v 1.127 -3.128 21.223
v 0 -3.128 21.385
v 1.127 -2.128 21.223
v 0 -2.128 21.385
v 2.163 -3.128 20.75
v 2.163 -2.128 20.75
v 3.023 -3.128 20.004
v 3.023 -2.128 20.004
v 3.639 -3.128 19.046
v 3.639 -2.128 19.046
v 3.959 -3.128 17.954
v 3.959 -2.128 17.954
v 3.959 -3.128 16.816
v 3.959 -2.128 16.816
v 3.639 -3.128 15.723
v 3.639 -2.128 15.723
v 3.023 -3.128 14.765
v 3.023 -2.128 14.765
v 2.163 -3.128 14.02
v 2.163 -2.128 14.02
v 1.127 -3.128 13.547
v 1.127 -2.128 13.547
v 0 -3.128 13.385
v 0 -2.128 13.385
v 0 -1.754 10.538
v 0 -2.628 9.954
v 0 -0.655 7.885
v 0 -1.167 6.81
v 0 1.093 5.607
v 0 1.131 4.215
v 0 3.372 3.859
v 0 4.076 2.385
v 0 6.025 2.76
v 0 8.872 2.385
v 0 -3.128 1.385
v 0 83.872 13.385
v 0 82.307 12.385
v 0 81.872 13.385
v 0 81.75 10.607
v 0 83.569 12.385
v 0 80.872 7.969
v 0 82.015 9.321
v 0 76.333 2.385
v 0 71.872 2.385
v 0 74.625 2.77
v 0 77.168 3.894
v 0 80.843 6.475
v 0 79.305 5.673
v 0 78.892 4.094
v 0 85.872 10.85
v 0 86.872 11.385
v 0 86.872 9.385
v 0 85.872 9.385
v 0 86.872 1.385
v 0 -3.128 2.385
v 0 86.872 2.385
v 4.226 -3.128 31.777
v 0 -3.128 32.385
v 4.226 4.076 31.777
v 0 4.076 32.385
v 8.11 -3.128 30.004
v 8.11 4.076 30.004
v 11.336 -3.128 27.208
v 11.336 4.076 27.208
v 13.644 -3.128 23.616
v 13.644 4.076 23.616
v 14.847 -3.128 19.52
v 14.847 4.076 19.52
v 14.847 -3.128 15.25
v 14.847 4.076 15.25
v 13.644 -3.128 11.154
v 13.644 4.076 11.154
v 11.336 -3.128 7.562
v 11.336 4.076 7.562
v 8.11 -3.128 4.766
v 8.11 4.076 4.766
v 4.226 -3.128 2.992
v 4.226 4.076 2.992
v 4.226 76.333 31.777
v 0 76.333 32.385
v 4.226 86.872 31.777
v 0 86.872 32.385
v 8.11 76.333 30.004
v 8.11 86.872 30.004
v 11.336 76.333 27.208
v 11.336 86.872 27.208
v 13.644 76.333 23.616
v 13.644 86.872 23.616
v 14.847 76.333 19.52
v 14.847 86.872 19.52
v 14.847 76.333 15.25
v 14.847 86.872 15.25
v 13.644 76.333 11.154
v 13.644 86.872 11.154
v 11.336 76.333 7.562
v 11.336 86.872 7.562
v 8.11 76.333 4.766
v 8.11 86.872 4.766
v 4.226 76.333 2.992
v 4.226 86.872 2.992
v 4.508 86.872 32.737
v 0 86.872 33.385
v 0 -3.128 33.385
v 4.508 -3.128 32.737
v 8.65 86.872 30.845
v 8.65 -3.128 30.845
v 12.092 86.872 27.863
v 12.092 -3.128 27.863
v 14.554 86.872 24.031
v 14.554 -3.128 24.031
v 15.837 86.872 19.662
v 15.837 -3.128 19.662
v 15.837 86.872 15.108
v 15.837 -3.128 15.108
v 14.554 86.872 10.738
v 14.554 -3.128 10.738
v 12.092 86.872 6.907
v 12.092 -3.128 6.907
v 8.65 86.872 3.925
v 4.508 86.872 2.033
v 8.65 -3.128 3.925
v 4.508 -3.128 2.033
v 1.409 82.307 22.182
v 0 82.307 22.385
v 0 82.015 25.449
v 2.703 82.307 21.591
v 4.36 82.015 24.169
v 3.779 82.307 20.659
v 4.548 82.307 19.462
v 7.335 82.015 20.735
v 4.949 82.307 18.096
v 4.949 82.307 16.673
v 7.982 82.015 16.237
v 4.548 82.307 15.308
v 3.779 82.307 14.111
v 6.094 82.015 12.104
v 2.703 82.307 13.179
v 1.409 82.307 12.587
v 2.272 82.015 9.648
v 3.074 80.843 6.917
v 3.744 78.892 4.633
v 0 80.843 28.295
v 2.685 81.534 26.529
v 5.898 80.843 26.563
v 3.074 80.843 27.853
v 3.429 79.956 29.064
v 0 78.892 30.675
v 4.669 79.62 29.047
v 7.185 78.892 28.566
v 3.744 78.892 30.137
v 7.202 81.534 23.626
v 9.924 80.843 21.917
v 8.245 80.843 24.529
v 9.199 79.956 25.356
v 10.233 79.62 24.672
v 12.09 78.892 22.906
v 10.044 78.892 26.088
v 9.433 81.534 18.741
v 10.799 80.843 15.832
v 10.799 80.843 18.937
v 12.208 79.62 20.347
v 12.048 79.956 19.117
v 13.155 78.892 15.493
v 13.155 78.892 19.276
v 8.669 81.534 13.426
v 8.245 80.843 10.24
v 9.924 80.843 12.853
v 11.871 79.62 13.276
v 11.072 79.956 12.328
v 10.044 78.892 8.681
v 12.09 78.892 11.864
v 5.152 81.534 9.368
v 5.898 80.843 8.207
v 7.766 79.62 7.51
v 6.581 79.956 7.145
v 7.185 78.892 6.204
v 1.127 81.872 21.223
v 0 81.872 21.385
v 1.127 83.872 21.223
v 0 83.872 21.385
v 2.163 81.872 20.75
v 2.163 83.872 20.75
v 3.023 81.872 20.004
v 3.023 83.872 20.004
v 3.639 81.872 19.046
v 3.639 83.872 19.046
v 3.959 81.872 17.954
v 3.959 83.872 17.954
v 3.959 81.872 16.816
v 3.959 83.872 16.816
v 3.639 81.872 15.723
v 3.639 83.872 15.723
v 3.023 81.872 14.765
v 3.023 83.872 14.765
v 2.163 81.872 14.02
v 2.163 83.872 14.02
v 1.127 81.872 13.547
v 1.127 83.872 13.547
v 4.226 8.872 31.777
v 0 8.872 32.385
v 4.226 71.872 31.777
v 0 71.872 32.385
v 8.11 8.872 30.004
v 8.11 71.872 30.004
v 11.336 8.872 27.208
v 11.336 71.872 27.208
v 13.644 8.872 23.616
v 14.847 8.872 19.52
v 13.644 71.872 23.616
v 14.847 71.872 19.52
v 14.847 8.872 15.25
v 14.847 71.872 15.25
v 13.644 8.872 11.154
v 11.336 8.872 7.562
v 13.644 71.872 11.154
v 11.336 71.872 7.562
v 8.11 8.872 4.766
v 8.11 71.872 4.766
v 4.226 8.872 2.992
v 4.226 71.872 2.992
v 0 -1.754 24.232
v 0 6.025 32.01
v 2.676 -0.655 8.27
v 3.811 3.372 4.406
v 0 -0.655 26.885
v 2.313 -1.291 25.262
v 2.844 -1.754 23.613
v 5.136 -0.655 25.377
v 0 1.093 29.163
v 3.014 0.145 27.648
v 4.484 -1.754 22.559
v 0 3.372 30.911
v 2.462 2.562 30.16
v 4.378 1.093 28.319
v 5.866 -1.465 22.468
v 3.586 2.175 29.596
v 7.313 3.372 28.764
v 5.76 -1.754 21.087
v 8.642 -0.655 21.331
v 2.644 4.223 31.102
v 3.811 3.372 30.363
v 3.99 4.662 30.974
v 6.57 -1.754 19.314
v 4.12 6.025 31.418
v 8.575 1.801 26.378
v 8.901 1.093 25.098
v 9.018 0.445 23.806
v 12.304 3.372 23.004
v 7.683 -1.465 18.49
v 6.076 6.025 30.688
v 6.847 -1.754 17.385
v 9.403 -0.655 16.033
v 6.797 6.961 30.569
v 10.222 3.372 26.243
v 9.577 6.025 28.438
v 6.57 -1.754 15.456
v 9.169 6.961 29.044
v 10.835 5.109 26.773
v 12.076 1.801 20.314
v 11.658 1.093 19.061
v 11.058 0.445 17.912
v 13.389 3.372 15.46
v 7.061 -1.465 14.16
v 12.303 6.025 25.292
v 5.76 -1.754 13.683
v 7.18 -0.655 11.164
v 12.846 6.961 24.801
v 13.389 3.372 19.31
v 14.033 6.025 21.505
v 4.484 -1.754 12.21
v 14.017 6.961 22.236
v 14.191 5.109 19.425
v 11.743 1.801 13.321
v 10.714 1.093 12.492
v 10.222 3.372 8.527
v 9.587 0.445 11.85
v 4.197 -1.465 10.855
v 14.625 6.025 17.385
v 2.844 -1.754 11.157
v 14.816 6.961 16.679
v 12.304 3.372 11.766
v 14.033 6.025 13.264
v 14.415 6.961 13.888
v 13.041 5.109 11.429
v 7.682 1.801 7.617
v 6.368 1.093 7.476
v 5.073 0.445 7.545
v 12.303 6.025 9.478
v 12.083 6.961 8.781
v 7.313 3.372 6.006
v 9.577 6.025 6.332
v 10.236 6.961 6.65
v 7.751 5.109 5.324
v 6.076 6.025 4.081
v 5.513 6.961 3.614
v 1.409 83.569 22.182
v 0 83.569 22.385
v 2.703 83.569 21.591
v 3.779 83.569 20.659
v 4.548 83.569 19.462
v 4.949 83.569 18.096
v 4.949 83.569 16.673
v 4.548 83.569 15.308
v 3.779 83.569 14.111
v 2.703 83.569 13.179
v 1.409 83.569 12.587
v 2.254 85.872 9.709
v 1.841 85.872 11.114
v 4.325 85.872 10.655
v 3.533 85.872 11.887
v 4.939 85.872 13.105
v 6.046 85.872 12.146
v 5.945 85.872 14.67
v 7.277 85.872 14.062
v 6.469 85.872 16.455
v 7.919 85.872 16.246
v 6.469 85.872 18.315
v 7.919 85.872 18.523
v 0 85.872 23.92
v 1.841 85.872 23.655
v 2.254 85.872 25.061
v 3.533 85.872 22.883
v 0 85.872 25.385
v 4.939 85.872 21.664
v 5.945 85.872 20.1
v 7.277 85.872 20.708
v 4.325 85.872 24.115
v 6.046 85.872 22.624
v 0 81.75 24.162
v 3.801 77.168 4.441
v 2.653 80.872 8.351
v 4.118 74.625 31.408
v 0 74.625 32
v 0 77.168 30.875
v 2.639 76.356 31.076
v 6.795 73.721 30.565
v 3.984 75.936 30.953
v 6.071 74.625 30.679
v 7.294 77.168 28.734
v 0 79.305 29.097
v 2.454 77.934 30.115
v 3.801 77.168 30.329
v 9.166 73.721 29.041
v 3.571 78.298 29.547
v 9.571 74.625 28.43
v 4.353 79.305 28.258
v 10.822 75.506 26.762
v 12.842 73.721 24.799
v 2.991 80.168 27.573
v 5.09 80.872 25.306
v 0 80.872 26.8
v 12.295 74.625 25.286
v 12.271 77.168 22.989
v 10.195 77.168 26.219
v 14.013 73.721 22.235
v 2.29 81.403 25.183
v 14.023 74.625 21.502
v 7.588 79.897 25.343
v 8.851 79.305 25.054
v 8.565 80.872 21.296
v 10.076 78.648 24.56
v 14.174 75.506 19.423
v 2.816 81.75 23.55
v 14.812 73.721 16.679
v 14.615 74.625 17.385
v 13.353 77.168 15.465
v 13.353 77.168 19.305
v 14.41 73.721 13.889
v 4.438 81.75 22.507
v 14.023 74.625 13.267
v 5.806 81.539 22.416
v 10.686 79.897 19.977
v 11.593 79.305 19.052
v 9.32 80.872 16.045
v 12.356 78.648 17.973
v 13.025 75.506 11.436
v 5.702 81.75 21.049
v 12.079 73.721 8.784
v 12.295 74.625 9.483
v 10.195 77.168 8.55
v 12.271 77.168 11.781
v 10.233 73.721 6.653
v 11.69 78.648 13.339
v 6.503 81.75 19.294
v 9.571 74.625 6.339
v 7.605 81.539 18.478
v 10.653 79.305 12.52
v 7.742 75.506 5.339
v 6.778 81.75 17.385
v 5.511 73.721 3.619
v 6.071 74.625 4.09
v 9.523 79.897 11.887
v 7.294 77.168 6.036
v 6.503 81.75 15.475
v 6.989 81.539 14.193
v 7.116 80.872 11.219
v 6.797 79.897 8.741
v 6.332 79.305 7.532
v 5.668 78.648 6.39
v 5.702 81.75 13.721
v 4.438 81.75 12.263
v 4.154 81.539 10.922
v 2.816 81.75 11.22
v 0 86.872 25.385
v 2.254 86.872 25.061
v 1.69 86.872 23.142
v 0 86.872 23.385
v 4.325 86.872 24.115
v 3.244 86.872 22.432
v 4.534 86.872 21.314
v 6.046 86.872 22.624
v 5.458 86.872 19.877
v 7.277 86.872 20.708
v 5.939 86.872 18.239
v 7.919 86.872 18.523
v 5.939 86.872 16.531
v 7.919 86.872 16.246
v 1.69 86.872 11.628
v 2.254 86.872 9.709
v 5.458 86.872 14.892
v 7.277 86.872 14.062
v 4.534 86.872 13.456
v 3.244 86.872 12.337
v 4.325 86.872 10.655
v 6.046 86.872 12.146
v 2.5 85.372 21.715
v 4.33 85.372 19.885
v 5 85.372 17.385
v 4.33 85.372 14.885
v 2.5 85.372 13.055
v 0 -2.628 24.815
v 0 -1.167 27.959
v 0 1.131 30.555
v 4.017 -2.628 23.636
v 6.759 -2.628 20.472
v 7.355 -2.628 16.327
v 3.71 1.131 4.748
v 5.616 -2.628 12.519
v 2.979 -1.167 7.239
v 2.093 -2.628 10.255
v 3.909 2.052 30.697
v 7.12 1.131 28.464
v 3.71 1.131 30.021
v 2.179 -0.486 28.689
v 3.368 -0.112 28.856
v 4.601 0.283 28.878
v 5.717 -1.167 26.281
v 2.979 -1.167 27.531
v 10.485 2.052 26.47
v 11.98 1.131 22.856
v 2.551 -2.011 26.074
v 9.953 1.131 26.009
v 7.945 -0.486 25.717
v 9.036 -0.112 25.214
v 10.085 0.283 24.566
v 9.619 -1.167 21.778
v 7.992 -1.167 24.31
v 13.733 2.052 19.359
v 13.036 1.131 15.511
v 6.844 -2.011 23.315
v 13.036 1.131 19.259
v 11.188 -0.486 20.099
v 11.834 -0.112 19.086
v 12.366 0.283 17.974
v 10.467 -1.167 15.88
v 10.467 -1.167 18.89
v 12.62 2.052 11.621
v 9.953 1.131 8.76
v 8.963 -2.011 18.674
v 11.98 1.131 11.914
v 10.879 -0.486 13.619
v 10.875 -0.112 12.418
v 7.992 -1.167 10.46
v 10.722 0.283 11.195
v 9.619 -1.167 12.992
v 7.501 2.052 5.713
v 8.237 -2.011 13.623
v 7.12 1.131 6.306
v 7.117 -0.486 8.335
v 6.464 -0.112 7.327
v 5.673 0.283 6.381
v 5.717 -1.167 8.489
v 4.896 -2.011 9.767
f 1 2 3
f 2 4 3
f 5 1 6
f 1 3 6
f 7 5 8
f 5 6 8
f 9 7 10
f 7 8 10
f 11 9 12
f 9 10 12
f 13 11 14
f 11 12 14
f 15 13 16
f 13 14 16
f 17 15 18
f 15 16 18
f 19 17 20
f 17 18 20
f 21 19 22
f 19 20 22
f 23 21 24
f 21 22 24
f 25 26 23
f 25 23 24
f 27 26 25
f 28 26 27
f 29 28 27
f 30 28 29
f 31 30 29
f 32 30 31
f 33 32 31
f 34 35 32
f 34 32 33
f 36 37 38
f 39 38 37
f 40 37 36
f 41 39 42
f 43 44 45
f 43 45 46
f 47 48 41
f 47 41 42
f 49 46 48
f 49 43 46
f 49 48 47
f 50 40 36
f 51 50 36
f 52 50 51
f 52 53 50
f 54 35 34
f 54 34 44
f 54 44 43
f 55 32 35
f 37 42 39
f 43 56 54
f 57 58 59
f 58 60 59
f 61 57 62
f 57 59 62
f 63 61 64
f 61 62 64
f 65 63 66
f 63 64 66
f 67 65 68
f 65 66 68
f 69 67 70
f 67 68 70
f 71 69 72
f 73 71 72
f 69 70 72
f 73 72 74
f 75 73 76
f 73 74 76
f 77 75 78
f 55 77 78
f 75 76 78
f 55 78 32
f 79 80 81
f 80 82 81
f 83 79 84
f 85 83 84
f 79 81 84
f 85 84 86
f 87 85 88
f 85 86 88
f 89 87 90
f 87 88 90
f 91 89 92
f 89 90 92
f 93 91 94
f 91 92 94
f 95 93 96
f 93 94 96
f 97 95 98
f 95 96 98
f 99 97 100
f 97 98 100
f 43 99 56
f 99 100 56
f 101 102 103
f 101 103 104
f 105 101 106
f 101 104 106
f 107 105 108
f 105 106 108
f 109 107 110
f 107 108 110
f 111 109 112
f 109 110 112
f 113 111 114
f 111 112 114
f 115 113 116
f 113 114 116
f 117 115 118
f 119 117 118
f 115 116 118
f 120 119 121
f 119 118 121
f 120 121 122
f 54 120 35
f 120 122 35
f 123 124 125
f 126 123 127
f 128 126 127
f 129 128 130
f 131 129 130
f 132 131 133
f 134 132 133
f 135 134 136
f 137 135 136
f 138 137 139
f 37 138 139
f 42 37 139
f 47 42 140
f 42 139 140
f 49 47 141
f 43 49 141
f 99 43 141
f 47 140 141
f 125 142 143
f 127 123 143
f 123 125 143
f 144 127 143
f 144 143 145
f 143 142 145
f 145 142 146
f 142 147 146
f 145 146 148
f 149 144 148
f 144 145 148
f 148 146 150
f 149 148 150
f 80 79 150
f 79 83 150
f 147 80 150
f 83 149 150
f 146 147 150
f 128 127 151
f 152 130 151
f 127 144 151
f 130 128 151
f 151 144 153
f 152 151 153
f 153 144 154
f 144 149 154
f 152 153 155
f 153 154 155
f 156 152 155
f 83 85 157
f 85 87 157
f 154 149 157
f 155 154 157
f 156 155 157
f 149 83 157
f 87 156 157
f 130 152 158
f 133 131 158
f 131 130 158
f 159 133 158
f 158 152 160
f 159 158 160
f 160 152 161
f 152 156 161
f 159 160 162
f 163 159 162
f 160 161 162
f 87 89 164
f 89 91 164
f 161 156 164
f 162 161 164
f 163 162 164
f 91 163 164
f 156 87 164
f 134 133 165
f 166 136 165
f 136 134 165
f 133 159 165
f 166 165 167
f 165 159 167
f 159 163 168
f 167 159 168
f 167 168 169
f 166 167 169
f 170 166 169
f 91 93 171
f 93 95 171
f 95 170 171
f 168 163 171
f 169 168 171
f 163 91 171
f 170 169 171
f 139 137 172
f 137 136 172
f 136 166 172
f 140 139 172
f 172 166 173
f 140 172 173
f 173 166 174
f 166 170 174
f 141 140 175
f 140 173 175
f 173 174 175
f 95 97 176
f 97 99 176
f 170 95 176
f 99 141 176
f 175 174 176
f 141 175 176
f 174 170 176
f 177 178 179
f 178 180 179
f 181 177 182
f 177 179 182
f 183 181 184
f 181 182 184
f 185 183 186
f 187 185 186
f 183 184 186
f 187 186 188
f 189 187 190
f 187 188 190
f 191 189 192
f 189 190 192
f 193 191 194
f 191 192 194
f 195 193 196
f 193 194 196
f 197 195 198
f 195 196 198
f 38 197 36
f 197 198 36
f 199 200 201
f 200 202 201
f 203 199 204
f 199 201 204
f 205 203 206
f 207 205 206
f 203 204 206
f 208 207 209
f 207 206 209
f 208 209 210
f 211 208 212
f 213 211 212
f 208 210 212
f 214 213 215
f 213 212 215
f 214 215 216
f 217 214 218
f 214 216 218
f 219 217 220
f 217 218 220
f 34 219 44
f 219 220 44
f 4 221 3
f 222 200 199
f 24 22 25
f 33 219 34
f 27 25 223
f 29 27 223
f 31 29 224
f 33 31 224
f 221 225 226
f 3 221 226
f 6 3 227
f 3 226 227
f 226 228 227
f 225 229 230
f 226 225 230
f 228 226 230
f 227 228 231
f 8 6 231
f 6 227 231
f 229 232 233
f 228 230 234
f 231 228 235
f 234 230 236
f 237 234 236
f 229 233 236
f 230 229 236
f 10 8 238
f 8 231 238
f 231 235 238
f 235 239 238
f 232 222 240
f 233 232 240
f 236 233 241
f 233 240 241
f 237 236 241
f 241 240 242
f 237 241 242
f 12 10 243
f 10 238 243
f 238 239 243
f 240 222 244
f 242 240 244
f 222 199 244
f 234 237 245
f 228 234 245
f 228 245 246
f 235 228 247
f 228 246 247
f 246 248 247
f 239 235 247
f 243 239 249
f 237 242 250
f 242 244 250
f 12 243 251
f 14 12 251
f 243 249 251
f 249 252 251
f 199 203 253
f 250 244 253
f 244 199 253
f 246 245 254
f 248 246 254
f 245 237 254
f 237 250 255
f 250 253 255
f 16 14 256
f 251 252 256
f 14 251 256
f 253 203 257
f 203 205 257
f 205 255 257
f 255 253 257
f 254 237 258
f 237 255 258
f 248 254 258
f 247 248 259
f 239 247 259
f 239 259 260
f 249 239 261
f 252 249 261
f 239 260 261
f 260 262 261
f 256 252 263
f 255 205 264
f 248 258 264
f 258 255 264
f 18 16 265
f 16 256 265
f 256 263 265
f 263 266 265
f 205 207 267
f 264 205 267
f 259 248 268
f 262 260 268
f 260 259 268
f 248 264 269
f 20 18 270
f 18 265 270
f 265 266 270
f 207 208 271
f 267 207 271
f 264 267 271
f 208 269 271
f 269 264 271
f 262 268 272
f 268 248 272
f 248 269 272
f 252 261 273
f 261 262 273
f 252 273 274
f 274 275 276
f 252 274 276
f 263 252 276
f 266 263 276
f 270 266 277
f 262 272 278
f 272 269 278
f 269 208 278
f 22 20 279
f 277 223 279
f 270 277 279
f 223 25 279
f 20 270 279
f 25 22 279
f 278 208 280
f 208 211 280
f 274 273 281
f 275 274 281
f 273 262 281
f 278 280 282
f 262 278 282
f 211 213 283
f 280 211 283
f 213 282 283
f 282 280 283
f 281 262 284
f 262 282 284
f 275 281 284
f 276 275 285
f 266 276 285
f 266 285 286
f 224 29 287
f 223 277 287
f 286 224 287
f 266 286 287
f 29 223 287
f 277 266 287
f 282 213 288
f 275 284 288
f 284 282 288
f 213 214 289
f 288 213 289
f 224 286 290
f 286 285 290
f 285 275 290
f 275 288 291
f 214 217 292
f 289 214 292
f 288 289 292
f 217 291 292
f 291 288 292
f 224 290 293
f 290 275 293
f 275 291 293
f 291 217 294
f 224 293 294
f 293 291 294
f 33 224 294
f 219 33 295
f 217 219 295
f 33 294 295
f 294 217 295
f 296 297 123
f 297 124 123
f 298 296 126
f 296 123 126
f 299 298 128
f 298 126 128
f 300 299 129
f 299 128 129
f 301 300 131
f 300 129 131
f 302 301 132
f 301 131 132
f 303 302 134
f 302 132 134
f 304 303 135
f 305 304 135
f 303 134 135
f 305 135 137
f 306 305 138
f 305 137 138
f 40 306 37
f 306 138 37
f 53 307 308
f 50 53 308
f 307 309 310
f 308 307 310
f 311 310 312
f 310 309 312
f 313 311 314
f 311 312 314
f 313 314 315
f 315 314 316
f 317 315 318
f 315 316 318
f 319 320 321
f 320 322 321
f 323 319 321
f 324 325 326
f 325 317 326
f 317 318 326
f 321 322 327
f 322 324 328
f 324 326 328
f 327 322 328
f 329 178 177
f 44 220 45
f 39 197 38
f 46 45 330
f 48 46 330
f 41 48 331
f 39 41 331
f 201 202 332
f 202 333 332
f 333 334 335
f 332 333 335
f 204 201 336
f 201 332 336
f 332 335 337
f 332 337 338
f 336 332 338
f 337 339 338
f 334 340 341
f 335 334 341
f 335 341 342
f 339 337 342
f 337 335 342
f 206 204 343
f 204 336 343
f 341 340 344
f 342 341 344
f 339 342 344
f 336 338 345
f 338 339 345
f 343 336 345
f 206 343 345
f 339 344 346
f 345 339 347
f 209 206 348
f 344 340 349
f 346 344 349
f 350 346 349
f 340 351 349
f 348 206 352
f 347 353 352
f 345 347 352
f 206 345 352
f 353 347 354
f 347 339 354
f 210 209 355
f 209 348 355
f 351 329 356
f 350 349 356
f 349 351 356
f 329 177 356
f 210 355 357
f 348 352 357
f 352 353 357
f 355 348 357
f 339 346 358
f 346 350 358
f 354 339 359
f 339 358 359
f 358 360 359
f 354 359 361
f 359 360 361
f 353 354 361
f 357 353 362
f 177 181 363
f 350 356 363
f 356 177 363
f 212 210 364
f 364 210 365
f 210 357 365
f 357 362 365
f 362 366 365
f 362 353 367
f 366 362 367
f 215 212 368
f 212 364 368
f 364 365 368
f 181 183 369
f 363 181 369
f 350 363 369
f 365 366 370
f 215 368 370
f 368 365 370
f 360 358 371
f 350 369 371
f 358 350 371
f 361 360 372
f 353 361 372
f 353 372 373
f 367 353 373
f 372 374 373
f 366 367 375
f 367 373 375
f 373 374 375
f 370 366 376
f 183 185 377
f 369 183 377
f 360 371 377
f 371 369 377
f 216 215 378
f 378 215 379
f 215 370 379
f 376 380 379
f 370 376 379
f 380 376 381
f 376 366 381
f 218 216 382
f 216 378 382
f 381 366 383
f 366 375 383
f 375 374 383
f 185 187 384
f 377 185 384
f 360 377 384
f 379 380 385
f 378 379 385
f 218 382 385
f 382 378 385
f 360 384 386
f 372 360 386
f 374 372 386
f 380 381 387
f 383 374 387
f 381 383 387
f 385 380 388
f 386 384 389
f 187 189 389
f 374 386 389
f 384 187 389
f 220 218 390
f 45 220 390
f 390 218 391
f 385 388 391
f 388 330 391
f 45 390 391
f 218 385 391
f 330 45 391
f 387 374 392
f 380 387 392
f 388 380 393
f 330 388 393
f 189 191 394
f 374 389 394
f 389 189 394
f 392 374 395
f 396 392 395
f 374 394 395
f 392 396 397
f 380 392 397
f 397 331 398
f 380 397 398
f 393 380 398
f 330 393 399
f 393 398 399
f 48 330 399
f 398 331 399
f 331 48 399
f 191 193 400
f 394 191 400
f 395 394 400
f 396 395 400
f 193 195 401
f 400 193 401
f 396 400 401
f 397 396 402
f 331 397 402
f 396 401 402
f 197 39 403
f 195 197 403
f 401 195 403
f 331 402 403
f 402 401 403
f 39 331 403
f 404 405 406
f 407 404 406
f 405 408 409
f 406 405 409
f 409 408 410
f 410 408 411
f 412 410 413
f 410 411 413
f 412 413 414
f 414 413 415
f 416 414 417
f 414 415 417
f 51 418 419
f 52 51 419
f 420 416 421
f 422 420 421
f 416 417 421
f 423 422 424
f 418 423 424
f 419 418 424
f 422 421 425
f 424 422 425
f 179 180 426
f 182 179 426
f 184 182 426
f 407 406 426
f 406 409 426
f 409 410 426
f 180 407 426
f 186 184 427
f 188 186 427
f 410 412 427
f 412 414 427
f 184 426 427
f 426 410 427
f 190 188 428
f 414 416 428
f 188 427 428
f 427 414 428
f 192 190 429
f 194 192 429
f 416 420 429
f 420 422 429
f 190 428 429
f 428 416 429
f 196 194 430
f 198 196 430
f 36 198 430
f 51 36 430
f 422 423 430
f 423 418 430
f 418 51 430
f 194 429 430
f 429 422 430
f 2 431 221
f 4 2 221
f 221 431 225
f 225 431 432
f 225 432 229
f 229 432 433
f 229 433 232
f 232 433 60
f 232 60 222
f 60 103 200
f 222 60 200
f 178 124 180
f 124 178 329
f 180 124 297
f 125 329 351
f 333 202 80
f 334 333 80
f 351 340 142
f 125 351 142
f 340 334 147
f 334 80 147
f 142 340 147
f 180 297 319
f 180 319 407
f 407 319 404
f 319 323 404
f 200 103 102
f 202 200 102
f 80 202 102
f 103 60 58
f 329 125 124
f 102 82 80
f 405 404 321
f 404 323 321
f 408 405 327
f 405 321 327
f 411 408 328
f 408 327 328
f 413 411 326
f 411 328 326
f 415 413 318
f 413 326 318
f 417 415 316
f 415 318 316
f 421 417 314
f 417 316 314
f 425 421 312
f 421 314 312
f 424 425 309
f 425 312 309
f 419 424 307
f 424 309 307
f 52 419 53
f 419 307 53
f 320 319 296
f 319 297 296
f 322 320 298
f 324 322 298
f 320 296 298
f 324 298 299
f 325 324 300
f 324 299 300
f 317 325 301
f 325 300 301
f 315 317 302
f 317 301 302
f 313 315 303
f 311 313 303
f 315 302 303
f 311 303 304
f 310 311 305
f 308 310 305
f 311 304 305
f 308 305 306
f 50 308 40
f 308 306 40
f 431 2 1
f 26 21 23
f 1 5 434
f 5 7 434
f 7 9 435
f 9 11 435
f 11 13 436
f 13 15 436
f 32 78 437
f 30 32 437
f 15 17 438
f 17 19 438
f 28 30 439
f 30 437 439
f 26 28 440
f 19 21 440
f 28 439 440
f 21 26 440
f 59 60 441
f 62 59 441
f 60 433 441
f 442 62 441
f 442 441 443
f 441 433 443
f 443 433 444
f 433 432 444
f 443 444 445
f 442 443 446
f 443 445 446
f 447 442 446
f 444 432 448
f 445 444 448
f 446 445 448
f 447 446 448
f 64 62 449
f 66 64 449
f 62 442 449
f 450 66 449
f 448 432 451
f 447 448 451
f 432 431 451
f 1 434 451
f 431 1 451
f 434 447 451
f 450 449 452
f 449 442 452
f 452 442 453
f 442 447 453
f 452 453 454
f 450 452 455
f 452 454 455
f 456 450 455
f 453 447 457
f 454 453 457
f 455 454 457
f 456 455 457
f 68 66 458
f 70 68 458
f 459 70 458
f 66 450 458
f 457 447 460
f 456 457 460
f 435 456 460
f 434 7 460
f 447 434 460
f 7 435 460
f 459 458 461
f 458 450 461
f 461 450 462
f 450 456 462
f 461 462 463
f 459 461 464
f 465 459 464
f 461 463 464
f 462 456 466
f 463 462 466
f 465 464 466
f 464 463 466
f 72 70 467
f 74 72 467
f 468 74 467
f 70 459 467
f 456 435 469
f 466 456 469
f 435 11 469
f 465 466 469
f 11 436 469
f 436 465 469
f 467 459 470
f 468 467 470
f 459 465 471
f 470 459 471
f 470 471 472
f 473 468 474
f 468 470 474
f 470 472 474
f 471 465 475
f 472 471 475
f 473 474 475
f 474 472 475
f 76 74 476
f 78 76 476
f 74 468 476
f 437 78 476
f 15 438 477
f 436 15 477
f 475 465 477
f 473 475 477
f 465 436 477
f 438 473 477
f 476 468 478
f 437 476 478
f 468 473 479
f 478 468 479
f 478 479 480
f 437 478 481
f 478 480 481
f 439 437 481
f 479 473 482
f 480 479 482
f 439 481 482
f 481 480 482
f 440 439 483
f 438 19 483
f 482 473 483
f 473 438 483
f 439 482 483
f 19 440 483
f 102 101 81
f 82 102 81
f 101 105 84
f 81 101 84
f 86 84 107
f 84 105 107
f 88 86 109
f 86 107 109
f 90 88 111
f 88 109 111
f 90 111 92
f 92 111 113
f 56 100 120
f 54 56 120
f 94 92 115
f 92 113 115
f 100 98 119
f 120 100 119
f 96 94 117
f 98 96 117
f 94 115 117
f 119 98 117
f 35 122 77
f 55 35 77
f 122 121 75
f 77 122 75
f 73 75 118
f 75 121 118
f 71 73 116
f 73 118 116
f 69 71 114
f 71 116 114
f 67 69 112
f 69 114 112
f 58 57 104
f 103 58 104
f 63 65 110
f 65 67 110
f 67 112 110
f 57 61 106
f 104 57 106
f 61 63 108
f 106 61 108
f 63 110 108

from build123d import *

# Parameters (mm, degrees)
F1_ANGLE = 180


# Not quite as in the source:
# - a feature names something its author has since deleted; it is built from what else it names


with BuildPart() as f1:
    # F0 (on Right) → F1 (revolve)
    with BuildSketch(Plane.YZ):
        with BuildLine():
            Line((86.8716222048, 33.384835436), (-3.1283777952, 33.384835436))
            Line((-3.1283777952, 33.384835436), (-3.1283777952, 32.384835436))
            Line((-3.1283777952, 32.384835436), (4.0757906815, 32.384835436))
            ThreePointArc((4.0757906815, 32.384835436), (-1.1670524657, 27.9594084914), (-3.1283777952, 21.384835436))
            Line((-3.1283777952, 21.384835436), (-2.1283777952, 21.384835436))
            ThreePointArc((-2.1283777952, 21.384835436), (1.0934476117, 29.1630100291), (8.8716222048, 32.384835436))
            Line((8.8716222048, 32.384835436), (71.8716222048, 32.384835436))
            ThreePointArc((71.8716222048, 32.384835436), (79.3046565784, 29.0966848666), (81.8716222048, 21.384835436))
            Line((81.8716222048, 21.384835436), (83.8716222048, 21.384835436))
            Line((83.8716222048, 21.384835436), (86.8716222048, 23.384835436))
            Line((86.8716222048, 23.384835436), (86.8716222048, 25.384835436))
            Line((86.8716222048, 25.384835436), (85.8716222048, 25.384835436))
            Line((85.8716222048, 25.384835436), (85.8716222048, 23.9200191945))
            Line((85.8716222048, 23.9200191945), (83.568846567, 22.384835436))
            Line((83.568846567, 22.384835436), (82.3074740727, 22.384835436))
            ThreePointArc((82.3074740727, 22.384835436), (80.8426391774, 28.2945551763), (76.3326351779, 32.384835436))
            Line((76.3326351779, 32.384835436), (86.8716222048, 32.384835436))
            Line((86.8716222048, 32.384835436), (86.8716222048, 33.384835436))
        make_face()
    revolve(axis=Axis((0, 40.3716222048, 17.384835436), (0, 1, 0)), revolution_arc=F1_ANGLE)


solid = f1.part
